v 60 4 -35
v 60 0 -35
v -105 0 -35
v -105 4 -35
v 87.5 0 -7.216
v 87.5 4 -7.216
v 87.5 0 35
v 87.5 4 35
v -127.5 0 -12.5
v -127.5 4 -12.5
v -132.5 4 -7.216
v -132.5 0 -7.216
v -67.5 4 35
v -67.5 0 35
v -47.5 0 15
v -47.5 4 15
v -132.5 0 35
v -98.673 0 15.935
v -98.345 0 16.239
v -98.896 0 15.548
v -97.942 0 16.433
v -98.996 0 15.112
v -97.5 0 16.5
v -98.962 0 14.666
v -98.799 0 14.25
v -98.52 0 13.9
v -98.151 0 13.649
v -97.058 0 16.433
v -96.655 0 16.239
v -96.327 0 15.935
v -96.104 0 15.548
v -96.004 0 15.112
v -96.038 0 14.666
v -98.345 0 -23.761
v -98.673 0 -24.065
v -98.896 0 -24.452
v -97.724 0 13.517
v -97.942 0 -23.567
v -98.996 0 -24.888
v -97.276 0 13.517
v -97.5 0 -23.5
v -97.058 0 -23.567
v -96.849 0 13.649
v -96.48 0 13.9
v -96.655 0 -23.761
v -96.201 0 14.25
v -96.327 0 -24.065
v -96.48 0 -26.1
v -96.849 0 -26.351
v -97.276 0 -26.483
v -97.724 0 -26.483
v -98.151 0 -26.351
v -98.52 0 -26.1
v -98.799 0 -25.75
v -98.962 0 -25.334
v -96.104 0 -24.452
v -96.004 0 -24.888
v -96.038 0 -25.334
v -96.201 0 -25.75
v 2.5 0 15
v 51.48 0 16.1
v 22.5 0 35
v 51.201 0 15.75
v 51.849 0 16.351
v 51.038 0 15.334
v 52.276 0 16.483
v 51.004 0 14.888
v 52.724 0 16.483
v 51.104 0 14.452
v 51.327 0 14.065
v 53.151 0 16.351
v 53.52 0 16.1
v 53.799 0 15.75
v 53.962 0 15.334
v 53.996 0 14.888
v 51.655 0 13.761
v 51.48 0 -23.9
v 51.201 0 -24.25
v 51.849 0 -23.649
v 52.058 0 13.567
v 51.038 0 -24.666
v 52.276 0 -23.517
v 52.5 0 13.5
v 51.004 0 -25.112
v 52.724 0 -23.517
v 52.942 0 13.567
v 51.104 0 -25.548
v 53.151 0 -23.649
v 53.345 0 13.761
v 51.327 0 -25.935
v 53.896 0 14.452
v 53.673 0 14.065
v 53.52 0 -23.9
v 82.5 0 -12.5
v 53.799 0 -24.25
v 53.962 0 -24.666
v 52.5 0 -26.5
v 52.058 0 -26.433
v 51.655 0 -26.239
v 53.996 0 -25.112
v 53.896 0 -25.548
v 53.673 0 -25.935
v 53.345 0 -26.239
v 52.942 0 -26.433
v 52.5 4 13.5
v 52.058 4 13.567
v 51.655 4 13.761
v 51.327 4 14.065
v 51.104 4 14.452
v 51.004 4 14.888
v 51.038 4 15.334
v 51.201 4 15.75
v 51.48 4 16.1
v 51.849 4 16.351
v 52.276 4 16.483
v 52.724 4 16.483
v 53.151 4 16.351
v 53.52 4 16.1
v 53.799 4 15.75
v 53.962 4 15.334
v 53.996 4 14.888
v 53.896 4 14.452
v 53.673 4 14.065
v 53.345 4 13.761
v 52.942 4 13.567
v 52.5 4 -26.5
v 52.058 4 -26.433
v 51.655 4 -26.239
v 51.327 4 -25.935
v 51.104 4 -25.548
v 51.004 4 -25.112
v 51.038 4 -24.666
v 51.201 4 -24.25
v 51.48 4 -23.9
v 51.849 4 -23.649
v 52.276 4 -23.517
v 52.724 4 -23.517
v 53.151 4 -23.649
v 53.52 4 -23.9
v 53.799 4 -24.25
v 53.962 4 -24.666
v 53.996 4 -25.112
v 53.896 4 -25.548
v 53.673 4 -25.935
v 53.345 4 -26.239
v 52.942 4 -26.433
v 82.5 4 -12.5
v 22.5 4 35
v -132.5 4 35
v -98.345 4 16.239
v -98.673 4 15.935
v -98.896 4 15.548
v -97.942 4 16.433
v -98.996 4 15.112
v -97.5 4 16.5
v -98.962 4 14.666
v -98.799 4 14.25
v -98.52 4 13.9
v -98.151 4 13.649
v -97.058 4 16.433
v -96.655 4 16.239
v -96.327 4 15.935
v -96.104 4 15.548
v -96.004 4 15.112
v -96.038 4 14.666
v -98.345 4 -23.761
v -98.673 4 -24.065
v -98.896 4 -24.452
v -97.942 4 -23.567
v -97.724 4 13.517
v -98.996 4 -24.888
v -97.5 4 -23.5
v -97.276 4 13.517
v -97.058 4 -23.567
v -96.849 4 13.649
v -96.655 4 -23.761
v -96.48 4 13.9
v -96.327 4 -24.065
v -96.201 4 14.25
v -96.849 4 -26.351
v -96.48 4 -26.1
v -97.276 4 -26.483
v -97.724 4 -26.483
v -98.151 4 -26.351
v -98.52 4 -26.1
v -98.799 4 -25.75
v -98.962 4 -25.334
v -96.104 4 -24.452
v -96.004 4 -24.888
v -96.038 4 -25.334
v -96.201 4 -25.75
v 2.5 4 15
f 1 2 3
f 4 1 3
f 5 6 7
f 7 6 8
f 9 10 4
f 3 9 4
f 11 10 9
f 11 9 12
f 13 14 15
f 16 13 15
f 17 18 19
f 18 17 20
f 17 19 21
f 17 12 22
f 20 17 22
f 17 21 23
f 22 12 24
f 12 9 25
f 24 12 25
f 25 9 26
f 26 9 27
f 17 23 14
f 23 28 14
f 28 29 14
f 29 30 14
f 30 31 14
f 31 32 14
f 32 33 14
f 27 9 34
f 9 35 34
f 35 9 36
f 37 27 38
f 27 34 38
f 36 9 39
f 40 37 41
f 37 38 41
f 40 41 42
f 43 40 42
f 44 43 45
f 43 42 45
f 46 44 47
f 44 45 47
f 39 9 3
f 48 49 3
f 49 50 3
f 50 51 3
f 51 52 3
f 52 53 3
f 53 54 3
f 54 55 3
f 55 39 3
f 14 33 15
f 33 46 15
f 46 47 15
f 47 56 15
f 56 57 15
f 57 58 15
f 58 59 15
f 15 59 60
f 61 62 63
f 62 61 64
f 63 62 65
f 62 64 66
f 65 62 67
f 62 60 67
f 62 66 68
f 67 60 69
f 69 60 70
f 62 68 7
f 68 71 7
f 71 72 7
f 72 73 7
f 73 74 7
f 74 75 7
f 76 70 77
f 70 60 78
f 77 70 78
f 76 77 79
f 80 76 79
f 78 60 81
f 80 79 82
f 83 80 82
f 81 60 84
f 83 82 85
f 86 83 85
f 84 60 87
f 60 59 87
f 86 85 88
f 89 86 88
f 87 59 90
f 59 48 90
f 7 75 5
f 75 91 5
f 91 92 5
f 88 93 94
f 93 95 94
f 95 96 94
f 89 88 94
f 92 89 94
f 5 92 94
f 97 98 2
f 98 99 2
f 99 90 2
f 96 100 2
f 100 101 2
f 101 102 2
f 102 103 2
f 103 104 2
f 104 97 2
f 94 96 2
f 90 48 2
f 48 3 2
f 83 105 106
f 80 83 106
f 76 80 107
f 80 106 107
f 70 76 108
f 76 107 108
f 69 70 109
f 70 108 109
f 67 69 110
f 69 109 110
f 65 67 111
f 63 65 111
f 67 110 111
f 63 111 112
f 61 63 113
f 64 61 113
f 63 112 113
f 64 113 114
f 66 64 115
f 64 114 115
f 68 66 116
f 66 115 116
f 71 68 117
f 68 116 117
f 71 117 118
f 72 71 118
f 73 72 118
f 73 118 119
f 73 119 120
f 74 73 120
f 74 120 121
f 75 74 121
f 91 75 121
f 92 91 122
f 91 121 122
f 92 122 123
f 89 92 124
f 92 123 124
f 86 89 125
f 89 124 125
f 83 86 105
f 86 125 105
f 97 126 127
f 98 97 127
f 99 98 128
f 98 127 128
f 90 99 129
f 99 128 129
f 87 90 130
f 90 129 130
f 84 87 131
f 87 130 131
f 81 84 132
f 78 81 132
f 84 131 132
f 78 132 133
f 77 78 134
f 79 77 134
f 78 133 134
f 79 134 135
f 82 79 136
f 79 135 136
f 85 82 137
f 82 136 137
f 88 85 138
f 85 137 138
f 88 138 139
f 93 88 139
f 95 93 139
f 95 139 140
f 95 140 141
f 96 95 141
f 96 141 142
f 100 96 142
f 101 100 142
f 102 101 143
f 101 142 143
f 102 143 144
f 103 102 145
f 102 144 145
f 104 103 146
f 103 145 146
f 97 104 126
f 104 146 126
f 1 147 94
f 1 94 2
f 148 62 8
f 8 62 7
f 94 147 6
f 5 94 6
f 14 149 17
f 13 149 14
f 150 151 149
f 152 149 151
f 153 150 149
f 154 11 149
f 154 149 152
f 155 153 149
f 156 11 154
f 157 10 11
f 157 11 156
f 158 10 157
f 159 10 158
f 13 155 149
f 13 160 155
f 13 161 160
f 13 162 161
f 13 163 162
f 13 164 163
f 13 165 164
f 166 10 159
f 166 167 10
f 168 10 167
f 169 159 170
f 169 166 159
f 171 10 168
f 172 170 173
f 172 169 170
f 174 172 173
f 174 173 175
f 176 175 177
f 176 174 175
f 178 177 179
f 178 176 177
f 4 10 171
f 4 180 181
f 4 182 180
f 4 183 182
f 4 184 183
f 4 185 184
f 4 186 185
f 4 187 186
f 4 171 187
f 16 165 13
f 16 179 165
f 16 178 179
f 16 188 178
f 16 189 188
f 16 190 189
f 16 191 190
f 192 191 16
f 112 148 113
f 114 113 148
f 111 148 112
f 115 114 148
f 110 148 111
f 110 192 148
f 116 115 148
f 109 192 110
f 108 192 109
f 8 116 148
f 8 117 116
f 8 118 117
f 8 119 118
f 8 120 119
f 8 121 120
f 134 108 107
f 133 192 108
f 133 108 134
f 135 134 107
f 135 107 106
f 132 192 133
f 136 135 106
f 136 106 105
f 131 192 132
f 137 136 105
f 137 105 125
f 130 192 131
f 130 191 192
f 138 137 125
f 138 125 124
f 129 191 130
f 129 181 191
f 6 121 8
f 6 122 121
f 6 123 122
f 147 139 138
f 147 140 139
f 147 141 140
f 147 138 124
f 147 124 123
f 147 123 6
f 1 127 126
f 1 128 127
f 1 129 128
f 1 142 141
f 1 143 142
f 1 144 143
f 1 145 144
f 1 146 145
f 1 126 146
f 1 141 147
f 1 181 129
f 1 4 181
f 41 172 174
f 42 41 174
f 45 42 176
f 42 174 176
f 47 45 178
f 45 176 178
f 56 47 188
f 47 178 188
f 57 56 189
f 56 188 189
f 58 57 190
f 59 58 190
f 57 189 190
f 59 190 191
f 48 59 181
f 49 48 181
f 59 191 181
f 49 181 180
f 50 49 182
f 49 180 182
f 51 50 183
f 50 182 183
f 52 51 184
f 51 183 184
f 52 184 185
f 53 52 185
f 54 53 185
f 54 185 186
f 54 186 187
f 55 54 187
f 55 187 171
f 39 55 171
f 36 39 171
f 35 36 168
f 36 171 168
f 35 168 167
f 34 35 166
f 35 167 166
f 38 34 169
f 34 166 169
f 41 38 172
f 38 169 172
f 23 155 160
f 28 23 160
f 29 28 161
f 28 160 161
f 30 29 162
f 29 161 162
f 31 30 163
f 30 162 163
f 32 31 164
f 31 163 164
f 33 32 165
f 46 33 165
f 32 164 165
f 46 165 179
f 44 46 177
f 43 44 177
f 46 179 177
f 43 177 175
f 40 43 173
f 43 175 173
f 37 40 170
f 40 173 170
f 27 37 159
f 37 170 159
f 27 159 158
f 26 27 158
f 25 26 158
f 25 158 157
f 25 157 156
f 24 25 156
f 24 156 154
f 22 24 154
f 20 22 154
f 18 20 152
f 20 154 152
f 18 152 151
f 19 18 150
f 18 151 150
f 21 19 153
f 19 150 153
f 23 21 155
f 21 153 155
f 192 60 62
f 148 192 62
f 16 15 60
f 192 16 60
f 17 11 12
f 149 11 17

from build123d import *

# Parameters (mm, degrees)
EXTRUDE_1_DEPTH     = 4
SKETCH_2_R          = 1.5
CUT_EXTRUDE_1_DEPTH = 4
SKETCH_3_W          = 10
SKETCH_3_H          = 69.678883607
SKETCH_3_H_2        = 93.047687854
CUT_EXTRUDE_2_DEPTH = 4
CUT_EXTRUDE_3_DEPTH = 4
EXTRUDE_2_DEPTH     = 4


with BuildPart() as part:
    # 草图1 → 凸台-拉伸1 (new body)
    with BuildSketch(Plane(origin=(0, 0, 0), x_dir=(1, 0, 0), z_dir=(0, 1, 0))):
        Polygon((-67.5, -35), (-47.5, -15), (2.5, -15), (22.5, -35), (92.5, -35), (92.5, 15), (72.5, 35), (-117.5, 35), (-137.5, 15), (-137.5, -35), align=None)
    extrude(amount=EXTRUDE_1_DEPTH)

    # 草图2 → 切除-拉伸1 (cut)
    with BuildSketch(Plane(origin=(0, 4, 0), x_dir=(1, 0, 0), z_dir=(0, 1, 0))):
        with Locations(Location((-97.5, -15, 0), (0, 0, 270))):
            Circle(SKETCH_2_R)
        with Locations(Location((-97.5, 25, 0), (0, 0, 270))):
            Circle(SKETCH_2_R)
        with Locations(Location((52.5, 25, 0), (0, 0, 90))):
            Circle(SKETCH_2_R)
        with Locations(Location((52.5, -15, 0), (0, 0, 90))):
            Circle(SKETCH_2_R)
    extrude(amount=-CUT_EXTRUDE_1_DEPTH, mode=Mode.SUBTRACT)

    # 草图3 → 切除-拉伸2 (cut)
    with BuildSketch(Plane(origin=(0, 4, 0), x_dir=(1, 0, 0), z_dir=(0, 1, 0))):
        with Locations((-132.5, -0.160558196)):
            Rectangle(SKETCH_3_W, SKETCH_3_H)
        with Locations((87.5, 11.523843927)):
            Rectangle(SKETCH_3_W, SKETCH_3_H_2)
    extrude(amount=-CUT_EXTRUDE_2_DEPTH, mode=Mode.SUBTRACT)

    # 草图4 → 切除-拉伸3 (cut)
    with BuildSketch(Plane(origin=(0, 4, 0), x_dir=(1, 0, 0), z_dir=(0, 1, 0))):
        Polygon((-127.5, 12.5), (-92.197077218, 47.802922782), (-150.178982695, 47.802922782), align=None)
        Polygon((82.5, 12.5), (37.005283765, 57.994716235), (96.544114713, 56.205234398), align=None)
    extrude(amount=-CUT_EXTRUDE_3_DEPTH, mode=Mode.SUBTRACT)

    # 草图5 → 凸台-拉伸2 (add)
    with BuildSketch(Plane(origin=(0, 4, 0), x_dir=(1, 0, 0), z_dir=(0, 1, 0))):
        Polygon((-127.5, 12.5), (-132.5, 7.215634365), (-132.5, -35), (-127.5, -35), align=None)
        Polygon((82.5, -35), (82.5, 12.5), (87.5, 7.215634365), (87.5, -35), align=None)
    extrude(amount=-EXTRUDE_2_DEPTH)


solid = part.part
